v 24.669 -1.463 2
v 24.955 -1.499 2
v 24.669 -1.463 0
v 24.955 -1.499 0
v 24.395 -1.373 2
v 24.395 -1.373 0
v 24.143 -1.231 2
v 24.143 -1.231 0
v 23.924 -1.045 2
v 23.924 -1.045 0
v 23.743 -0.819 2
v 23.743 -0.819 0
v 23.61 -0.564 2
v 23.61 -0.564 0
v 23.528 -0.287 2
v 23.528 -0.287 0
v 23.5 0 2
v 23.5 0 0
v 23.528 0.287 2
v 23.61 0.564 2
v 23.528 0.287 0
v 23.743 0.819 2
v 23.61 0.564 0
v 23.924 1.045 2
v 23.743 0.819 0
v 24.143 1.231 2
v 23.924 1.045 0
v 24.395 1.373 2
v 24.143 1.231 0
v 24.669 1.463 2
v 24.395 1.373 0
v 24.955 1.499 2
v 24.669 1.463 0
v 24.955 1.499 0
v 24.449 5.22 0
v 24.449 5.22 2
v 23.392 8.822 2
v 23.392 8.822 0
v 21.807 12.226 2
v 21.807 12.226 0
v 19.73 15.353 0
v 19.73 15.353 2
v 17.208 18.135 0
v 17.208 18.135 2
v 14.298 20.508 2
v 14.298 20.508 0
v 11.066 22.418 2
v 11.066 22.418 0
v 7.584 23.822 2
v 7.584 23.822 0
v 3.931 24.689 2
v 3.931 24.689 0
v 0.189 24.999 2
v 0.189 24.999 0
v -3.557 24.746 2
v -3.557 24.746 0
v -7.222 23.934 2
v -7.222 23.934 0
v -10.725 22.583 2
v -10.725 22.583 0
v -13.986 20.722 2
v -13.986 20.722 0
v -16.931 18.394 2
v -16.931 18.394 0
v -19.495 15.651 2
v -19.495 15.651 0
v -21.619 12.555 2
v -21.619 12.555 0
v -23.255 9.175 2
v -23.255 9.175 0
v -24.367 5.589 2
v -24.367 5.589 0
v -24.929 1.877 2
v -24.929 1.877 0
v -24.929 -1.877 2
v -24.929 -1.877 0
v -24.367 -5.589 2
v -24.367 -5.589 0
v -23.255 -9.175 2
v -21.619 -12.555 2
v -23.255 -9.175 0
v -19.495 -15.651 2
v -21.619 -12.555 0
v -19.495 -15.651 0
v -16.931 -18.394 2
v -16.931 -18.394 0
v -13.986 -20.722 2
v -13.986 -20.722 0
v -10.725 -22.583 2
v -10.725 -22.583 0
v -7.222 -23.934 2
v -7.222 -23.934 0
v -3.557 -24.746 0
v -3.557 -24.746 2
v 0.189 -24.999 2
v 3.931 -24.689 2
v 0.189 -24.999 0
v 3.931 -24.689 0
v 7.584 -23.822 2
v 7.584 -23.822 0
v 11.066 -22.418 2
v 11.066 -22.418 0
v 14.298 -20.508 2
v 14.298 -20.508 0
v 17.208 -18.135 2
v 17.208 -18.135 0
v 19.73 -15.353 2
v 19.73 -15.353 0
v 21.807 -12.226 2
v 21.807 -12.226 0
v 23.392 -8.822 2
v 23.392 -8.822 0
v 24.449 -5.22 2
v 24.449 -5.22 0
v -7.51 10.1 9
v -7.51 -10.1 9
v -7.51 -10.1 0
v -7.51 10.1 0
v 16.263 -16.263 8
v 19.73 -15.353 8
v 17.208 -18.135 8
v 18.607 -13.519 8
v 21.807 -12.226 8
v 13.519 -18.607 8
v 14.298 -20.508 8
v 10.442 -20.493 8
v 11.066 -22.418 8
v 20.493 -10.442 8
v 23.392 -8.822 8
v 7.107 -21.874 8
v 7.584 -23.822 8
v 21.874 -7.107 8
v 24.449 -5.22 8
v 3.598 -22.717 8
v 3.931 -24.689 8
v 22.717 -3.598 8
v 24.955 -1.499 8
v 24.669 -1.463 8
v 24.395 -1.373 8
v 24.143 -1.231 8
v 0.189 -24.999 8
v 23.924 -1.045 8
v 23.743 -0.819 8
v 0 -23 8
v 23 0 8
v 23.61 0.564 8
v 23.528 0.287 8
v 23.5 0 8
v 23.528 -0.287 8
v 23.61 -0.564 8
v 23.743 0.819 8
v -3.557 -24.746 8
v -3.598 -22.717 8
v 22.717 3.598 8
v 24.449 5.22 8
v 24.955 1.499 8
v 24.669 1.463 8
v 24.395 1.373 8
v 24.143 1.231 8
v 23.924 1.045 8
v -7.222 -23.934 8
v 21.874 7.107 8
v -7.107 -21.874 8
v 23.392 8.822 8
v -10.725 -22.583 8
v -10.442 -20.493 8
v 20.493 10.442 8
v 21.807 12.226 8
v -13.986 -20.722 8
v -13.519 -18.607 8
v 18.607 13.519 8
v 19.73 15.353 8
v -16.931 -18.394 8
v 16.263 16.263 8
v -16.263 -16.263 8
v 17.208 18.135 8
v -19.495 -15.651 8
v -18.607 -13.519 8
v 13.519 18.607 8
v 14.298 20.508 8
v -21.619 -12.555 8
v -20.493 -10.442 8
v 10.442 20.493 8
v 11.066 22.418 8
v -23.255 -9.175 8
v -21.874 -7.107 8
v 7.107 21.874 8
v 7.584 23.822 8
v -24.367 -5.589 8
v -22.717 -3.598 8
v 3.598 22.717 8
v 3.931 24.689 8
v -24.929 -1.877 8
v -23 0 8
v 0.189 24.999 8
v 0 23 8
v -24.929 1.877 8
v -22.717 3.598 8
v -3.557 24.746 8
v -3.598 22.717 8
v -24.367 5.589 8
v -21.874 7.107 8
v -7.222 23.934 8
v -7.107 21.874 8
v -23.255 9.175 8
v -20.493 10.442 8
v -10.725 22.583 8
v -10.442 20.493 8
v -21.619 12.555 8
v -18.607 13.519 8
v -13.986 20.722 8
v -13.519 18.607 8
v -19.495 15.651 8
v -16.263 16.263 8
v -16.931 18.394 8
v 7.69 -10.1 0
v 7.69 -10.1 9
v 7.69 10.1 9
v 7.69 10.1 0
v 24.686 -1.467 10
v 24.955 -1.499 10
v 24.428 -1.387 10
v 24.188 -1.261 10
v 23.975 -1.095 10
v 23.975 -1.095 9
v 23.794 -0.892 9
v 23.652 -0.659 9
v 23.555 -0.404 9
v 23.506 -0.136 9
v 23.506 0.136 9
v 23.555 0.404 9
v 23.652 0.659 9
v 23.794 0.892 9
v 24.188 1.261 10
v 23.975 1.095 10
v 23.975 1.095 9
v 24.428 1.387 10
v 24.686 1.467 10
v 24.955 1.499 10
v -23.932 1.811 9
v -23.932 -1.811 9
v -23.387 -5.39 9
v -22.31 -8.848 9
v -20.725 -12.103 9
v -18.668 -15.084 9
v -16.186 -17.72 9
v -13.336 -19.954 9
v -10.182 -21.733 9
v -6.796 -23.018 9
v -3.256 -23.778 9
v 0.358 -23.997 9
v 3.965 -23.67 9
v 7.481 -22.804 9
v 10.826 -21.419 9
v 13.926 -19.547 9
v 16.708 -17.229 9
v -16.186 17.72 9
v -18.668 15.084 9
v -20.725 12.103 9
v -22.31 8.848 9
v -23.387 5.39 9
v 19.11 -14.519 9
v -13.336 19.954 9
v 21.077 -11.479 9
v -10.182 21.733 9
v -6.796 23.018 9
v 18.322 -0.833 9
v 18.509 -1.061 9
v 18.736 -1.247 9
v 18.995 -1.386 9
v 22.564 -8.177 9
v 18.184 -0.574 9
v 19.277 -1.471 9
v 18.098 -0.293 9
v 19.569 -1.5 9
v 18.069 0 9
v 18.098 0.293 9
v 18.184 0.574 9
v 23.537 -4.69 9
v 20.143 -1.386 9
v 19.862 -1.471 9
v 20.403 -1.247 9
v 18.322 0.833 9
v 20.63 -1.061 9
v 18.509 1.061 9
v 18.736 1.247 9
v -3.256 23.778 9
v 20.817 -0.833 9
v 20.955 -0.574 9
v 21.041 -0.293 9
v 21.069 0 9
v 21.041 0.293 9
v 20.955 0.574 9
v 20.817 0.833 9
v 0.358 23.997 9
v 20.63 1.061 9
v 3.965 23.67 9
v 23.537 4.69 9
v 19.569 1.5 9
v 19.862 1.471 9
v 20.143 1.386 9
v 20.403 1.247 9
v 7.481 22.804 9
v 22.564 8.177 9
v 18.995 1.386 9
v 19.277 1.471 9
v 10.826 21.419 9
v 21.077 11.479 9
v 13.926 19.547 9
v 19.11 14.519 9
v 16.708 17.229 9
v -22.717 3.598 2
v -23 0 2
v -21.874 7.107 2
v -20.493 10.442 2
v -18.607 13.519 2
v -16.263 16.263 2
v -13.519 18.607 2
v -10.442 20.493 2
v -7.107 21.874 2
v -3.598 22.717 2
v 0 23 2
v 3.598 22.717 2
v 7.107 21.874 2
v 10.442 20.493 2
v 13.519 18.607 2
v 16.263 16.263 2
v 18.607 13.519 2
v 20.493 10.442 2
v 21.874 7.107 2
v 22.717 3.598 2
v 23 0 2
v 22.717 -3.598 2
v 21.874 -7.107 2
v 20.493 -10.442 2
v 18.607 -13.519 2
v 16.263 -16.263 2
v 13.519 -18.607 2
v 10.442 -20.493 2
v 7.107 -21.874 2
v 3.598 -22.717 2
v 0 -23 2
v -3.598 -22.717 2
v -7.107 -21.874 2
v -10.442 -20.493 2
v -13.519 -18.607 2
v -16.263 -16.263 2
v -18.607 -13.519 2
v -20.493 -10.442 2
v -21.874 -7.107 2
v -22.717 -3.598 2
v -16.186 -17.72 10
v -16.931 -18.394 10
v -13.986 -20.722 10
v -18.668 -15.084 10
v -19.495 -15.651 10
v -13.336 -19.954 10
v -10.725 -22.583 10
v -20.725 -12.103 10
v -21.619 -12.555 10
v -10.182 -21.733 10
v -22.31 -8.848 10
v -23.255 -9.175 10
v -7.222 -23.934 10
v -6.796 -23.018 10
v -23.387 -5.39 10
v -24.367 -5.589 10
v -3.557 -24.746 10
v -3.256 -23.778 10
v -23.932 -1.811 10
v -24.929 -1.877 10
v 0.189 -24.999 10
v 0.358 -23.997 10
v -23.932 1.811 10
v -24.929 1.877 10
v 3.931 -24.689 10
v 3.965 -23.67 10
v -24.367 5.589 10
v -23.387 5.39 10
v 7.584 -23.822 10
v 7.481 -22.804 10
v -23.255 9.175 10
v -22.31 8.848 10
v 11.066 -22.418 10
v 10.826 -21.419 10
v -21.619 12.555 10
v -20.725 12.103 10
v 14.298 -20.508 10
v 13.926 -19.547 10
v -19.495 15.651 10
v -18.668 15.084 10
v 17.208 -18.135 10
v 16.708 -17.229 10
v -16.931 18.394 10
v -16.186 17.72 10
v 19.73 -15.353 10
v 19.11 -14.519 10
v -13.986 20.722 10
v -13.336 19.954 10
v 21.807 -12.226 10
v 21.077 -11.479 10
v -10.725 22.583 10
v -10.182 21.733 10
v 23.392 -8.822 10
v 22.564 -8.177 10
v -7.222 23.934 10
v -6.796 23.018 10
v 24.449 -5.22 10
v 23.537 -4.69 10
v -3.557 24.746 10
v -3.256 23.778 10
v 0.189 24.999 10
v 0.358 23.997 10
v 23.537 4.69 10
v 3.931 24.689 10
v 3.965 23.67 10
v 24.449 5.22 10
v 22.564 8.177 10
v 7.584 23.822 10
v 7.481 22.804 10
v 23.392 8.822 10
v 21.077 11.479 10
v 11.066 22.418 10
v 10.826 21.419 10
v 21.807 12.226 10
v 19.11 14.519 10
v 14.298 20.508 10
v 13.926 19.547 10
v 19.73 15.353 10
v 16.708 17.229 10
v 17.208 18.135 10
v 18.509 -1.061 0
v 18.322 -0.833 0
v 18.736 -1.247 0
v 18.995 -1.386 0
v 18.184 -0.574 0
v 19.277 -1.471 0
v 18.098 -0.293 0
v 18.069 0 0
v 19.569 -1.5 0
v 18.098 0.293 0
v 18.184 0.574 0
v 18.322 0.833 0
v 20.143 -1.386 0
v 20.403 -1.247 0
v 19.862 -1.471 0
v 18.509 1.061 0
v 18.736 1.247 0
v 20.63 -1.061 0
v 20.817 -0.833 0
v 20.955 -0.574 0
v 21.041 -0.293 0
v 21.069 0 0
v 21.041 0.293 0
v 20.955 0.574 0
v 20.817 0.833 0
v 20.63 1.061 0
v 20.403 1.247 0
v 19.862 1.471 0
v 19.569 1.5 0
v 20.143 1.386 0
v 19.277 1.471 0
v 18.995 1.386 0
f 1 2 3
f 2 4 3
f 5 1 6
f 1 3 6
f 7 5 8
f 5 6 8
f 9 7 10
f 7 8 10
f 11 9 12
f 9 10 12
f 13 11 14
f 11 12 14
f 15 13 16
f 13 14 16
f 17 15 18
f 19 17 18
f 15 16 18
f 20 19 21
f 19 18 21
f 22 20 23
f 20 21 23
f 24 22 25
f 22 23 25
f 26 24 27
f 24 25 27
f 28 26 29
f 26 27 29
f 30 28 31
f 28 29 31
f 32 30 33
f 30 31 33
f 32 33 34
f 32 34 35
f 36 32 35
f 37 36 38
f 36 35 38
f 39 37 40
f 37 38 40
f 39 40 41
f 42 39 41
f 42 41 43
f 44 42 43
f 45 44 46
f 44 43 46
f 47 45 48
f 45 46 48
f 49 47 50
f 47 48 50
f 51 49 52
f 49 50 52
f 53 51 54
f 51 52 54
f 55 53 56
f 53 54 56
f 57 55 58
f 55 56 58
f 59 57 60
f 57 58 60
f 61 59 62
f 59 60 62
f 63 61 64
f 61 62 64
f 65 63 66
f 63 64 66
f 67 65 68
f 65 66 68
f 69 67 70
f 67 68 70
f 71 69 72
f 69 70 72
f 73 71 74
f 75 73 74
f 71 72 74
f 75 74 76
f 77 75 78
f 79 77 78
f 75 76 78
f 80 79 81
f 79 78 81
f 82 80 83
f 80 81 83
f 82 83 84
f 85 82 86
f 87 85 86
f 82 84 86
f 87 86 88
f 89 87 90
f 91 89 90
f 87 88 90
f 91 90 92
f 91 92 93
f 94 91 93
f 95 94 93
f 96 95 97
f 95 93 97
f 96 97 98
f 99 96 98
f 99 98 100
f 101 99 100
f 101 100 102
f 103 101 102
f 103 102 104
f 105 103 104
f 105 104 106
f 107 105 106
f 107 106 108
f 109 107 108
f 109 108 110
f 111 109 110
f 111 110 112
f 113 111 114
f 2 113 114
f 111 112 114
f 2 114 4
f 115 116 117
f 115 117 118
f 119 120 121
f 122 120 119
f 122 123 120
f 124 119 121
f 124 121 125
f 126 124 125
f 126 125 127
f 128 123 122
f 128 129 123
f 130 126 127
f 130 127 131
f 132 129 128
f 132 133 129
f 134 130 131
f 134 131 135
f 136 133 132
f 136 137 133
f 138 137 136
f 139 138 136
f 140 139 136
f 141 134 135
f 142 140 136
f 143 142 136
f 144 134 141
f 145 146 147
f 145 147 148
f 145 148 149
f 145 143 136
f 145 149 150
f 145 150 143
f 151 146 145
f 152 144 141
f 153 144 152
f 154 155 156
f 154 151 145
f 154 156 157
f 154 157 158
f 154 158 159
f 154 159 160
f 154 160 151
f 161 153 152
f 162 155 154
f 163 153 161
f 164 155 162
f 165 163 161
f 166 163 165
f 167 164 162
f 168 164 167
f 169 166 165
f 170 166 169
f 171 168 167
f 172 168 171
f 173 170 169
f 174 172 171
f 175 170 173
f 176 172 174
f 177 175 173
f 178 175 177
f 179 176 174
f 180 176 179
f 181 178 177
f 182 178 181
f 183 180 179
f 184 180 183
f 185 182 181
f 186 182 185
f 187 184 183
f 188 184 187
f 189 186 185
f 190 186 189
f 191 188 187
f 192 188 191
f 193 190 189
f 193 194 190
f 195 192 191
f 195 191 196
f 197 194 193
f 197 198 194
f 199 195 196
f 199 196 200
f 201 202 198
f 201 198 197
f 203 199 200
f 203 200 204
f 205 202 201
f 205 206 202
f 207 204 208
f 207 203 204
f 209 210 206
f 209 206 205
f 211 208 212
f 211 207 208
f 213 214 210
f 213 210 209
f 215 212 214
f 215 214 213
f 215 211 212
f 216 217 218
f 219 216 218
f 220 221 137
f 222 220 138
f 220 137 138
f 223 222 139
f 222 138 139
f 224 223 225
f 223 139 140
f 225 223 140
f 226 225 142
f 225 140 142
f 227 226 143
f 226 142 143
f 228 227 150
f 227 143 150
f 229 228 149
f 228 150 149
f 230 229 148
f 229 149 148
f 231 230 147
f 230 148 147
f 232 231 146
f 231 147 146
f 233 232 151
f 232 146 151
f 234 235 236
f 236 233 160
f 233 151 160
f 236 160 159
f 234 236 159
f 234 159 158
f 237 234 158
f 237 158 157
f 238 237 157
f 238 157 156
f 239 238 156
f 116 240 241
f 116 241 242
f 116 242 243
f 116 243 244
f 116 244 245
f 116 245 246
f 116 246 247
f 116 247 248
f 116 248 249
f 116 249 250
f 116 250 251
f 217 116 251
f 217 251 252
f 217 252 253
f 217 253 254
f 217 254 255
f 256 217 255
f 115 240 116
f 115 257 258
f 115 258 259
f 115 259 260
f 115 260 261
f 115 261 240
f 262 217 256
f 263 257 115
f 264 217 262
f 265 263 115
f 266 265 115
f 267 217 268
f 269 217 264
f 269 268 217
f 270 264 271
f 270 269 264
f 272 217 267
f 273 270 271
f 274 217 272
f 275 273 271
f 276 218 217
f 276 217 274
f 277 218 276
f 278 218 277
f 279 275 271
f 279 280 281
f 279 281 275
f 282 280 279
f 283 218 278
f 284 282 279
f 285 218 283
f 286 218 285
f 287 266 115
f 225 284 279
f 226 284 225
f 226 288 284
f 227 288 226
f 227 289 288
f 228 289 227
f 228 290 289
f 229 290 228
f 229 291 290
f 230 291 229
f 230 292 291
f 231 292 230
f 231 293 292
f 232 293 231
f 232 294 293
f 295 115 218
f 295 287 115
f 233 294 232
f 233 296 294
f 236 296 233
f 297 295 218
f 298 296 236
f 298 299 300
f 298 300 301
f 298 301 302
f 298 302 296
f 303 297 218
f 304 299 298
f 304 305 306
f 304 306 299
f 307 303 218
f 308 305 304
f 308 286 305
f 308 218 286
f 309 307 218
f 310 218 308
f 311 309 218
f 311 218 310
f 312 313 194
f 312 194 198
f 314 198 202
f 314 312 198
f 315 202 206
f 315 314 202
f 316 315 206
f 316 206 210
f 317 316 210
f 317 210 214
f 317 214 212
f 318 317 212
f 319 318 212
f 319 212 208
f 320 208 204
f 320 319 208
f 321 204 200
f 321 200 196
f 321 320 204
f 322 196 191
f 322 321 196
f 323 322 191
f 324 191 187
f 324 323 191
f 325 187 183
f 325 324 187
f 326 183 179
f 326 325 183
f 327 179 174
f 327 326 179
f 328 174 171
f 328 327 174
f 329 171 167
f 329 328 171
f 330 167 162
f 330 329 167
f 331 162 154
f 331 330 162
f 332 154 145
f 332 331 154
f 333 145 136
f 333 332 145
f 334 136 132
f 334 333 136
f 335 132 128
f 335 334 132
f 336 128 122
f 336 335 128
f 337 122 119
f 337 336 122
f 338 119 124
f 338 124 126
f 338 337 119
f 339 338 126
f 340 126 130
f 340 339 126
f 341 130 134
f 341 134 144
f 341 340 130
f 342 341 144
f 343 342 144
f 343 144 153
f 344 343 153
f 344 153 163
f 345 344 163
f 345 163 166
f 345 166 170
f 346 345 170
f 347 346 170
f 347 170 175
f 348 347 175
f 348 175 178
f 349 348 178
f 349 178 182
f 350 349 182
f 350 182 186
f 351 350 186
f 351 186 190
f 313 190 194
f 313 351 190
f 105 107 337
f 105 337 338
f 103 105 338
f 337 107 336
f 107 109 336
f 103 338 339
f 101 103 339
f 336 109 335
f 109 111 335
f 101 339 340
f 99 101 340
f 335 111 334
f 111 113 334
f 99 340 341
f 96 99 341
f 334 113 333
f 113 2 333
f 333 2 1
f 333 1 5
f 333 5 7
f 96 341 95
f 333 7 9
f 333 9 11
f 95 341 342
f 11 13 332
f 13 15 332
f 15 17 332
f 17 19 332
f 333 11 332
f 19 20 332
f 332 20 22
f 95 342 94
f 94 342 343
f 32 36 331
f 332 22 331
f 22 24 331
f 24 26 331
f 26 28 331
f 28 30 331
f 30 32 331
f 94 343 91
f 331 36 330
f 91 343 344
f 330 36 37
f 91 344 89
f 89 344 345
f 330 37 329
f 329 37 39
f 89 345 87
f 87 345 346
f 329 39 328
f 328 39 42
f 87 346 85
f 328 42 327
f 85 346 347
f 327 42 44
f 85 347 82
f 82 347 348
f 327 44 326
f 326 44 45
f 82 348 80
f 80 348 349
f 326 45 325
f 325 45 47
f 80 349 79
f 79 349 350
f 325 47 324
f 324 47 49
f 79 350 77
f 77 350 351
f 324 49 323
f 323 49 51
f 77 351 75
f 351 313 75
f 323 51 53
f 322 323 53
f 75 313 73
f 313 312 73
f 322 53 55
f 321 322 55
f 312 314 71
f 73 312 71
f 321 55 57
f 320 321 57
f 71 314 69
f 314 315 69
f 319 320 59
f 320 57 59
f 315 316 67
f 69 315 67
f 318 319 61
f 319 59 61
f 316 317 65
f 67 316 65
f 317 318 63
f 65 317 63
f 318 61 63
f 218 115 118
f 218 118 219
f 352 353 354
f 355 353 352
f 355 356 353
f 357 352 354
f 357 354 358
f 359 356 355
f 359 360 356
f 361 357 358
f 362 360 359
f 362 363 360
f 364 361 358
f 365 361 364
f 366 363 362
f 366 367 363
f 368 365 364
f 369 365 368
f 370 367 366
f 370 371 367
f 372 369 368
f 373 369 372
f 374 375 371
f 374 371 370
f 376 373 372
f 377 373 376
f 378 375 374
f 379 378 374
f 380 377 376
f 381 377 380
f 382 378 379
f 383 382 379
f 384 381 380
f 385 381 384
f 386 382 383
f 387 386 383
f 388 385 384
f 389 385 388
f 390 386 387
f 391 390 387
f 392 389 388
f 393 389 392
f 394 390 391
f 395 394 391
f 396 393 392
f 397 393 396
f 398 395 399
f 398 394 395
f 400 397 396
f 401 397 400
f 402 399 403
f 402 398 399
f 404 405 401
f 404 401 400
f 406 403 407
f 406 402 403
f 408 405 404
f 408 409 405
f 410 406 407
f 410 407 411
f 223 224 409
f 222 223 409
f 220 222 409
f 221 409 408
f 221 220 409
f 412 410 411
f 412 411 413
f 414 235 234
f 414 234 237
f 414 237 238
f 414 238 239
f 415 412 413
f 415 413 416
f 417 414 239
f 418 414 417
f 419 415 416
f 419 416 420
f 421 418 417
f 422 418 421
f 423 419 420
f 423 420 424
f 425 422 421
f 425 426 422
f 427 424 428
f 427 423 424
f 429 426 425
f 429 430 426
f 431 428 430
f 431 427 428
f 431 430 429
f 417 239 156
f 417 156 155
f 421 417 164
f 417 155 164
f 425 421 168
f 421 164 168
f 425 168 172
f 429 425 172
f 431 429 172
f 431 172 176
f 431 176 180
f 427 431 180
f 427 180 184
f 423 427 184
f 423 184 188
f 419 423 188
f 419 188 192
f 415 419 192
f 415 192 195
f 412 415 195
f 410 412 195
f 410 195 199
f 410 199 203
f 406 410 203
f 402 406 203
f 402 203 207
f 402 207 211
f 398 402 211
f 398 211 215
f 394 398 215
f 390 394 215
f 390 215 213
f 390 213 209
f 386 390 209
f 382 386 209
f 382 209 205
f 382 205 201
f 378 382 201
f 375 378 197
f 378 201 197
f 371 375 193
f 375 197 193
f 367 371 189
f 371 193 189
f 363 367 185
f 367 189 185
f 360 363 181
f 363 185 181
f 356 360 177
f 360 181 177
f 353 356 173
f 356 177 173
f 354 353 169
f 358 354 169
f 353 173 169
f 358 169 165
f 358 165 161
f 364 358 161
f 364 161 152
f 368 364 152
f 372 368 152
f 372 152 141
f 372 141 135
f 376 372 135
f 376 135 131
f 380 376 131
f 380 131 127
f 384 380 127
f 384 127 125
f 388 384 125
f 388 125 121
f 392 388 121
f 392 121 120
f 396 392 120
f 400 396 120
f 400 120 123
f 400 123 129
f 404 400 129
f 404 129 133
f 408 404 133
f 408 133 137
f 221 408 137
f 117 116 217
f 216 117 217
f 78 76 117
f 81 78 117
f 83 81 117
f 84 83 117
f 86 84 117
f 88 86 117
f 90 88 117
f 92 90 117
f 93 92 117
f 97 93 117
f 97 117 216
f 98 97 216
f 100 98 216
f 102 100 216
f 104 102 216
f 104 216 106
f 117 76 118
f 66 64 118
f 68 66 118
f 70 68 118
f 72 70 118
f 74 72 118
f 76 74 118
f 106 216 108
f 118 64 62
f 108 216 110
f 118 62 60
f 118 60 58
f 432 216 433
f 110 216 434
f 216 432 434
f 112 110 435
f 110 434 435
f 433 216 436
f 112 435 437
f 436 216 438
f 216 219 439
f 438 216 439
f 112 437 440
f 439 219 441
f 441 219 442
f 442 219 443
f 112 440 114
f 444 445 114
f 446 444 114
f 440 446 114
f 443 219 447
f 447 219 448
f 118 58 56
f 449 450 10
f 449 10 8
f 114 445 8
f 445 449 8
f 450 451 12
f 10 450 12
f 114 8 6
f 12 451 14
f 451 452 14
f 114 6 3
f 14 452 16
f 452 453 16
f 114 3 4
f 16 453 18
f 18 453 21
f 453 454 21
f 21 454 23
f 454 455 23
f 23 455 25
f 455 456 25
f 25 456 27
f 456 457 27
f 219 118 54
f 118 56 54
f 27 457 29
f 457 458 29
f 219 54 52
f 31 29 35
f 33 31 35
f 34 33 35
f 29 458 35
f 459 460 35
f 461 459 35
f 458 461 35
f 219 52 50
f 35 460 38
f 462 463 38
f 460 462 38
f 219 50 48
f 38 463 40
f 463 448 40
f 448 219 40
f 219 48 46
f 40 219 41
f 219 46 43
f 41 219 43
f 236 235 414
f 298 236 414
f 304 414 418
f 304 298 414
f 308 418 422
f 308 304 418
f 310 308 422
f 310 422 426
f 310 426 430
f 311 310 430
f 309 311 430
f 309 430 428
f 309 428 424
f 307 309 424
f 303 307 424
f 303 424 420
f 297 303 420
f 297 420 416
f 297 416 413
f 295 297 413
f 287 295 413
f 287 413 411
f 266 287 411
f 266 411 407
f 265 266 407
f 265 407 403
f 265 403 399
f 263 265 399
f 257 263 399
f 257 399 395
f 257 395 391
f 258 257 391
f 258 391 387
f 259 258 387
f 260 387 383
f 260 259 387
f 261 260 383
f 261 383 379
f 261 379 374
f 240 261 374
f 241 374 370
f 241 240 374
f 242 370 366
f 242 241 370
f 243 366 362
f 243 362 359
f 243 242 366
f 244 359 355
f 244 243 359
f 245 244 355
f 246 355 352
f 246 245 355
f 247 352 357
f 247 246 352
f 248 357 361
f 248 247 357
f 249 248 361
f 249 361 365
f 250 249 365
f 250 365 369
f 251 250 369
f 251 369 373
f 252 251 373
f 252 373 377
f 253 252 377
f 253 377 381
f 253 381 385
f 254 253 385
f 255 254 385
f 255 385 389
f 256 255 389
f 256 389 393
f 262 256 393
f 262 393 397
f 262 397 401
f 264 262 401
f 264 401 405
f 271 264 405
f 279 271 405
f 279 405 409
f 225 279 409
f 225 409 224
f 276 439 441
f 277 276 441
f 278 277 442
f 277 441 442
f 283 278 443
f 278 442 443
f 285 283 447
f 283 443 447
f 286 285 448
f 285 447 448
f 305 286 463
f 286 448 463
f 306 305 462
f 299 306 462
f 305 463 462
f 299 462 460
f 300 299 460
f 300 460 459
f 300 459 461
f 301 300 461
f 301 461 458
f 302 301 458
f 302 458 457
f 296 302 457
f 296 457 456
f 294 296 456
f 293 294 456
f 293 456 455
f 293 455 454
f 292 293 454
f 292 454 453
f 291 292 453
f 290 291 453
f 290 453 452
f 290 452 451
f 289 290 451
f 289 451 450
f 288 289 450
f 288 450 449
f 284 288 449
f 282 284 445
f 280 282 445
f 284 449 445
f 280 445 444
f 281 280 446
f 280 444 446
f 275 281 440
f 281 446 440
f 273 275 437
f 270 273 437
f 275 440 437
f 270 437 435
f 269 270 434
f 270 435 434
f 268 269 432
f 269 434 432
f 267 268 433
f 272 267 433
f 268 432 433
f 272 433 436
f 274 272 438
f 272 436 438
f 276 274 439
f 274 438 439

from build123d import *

# Parameters (mm, degrees)
SKIZZE1_R                       = 25
AUFSATZ_LINEAR_AUSTRAGEN1_DEPTH = 9
SKIZZE3_R                       = 25
SKIZZE3_R_2                     = 24
AUFSATZ_LINEAR_AUSTRAGEN2_DEPTH = 1
SCHNITT_LINEAR_AUSTRAGEN1_REACH = 38.483
SKIZZE4_W                       = 15.2
SKIZZE4_H                       = 20.2
SKIZZE6_R                       = 25
SKIZZE6_R_2                     = 23
SCHNITT_LINEAR_AUSTRAGEN2_DEPTH = 6
SKIZZE7_R                       = 1.5
SCHNITT_LINEAR_AUSTRAGEN3_DEPTH = 37.742346142
SKIZZE8_R                       = 1.5
SCHNITT_LINEAR_AUSTRAGEN4_DEPTH = 37.742346142


with BuildPart() as part:
    # Skizze1 → Aufsatz-Linear austragen1 (new body)
    with BuildSketch(Plane.XY):
        Circle(SKIZZE1_R)
    extrude(amount=AUFSATZ_LINEAR_AUSTRAGEN1_DEPTH)

    # Skizze3 → Aufsatz-Linear austragen2 (add)
    with BuildSketch(Plane.XY.offset(9)):
        Circle(SKIZZE3_R)
        Circle(SKIZZE3_R_2, mode=Mode.SUBTRACT)
    extrude(amount=AUFSATZ_LINEAR_AUSTRAGEN2_DEPTH)

    # Skizze4 → Schnitt-Linear austragen1 (cut, up to next)
    with BuildSketch(Plane.XY.offset(9), mode=Mode.PRIVATE) as schnitt_linear_austragen1_sk1:
        with Locations((0.09, 0)):
            Rectangle(SKIZZE4_W, SKIZZE4_H)
    schnitt_linear_austragen1_tool1 = extrude(schnitt_linear_austragen1_sk1.sketch, amount=-SCHNITT_LINEAR_AUSTRAGEN1_REACH, mode=Mode.PRIVATE) & part.part
    add(schnitt_linear_austragen1_tool1.solids().sort_by_distance((0.09, 0, 9))[0], mode=Mode.SUBTRACT)

    # Skizze6 → Schnitt-Linear austragen2 (cut)
    with BuildSketch(Plane(origin=(0, 0, 2), x_dir=(-1, 0, 0), z_dir=(0, 0, -1))):
        Circle(SKIZZE6_R)
        Circle(SKIZZE6_R_2, mode=Mode.SUBTRACT)
    extrude(amount=-SCHNITT_LINEAR_AUSTRAGEN2_DEPTH, mode=Mode.SUBTRACT)

    # Skizze7 → Schnitt-Linear austragen3 (cut, through all)
    with BuildSketch(Plane(origin=(0, 0, 0), x_dir=(-1, 0, 0), z_dir=(0, 0, -1))):
        with Locations((-19.569472829, 0)):
            Circle(SKIZZE7_R)
    extrude(amount=-SCHNITT_LINEAR_AUSTRAGEN3_DEPTH, mode=Mode.SUBTRACT)

    # Skizze8 → Schnitt-Linear austragen4 (cut, through all)
    with BuildSketch(Plane(origin=(0, 0, 0), x_dir=(-1, 0, 0), z_dir=(0, 0, -1))):
        with Locations((-25, 0)):
            Circle(SKIZZE8_R)
    extrude(amount=-SCHNITT_LINEAR_AUSTRAGEN4_DEPTH, mode=Mode.SUBTRACT)


solid = part.part
